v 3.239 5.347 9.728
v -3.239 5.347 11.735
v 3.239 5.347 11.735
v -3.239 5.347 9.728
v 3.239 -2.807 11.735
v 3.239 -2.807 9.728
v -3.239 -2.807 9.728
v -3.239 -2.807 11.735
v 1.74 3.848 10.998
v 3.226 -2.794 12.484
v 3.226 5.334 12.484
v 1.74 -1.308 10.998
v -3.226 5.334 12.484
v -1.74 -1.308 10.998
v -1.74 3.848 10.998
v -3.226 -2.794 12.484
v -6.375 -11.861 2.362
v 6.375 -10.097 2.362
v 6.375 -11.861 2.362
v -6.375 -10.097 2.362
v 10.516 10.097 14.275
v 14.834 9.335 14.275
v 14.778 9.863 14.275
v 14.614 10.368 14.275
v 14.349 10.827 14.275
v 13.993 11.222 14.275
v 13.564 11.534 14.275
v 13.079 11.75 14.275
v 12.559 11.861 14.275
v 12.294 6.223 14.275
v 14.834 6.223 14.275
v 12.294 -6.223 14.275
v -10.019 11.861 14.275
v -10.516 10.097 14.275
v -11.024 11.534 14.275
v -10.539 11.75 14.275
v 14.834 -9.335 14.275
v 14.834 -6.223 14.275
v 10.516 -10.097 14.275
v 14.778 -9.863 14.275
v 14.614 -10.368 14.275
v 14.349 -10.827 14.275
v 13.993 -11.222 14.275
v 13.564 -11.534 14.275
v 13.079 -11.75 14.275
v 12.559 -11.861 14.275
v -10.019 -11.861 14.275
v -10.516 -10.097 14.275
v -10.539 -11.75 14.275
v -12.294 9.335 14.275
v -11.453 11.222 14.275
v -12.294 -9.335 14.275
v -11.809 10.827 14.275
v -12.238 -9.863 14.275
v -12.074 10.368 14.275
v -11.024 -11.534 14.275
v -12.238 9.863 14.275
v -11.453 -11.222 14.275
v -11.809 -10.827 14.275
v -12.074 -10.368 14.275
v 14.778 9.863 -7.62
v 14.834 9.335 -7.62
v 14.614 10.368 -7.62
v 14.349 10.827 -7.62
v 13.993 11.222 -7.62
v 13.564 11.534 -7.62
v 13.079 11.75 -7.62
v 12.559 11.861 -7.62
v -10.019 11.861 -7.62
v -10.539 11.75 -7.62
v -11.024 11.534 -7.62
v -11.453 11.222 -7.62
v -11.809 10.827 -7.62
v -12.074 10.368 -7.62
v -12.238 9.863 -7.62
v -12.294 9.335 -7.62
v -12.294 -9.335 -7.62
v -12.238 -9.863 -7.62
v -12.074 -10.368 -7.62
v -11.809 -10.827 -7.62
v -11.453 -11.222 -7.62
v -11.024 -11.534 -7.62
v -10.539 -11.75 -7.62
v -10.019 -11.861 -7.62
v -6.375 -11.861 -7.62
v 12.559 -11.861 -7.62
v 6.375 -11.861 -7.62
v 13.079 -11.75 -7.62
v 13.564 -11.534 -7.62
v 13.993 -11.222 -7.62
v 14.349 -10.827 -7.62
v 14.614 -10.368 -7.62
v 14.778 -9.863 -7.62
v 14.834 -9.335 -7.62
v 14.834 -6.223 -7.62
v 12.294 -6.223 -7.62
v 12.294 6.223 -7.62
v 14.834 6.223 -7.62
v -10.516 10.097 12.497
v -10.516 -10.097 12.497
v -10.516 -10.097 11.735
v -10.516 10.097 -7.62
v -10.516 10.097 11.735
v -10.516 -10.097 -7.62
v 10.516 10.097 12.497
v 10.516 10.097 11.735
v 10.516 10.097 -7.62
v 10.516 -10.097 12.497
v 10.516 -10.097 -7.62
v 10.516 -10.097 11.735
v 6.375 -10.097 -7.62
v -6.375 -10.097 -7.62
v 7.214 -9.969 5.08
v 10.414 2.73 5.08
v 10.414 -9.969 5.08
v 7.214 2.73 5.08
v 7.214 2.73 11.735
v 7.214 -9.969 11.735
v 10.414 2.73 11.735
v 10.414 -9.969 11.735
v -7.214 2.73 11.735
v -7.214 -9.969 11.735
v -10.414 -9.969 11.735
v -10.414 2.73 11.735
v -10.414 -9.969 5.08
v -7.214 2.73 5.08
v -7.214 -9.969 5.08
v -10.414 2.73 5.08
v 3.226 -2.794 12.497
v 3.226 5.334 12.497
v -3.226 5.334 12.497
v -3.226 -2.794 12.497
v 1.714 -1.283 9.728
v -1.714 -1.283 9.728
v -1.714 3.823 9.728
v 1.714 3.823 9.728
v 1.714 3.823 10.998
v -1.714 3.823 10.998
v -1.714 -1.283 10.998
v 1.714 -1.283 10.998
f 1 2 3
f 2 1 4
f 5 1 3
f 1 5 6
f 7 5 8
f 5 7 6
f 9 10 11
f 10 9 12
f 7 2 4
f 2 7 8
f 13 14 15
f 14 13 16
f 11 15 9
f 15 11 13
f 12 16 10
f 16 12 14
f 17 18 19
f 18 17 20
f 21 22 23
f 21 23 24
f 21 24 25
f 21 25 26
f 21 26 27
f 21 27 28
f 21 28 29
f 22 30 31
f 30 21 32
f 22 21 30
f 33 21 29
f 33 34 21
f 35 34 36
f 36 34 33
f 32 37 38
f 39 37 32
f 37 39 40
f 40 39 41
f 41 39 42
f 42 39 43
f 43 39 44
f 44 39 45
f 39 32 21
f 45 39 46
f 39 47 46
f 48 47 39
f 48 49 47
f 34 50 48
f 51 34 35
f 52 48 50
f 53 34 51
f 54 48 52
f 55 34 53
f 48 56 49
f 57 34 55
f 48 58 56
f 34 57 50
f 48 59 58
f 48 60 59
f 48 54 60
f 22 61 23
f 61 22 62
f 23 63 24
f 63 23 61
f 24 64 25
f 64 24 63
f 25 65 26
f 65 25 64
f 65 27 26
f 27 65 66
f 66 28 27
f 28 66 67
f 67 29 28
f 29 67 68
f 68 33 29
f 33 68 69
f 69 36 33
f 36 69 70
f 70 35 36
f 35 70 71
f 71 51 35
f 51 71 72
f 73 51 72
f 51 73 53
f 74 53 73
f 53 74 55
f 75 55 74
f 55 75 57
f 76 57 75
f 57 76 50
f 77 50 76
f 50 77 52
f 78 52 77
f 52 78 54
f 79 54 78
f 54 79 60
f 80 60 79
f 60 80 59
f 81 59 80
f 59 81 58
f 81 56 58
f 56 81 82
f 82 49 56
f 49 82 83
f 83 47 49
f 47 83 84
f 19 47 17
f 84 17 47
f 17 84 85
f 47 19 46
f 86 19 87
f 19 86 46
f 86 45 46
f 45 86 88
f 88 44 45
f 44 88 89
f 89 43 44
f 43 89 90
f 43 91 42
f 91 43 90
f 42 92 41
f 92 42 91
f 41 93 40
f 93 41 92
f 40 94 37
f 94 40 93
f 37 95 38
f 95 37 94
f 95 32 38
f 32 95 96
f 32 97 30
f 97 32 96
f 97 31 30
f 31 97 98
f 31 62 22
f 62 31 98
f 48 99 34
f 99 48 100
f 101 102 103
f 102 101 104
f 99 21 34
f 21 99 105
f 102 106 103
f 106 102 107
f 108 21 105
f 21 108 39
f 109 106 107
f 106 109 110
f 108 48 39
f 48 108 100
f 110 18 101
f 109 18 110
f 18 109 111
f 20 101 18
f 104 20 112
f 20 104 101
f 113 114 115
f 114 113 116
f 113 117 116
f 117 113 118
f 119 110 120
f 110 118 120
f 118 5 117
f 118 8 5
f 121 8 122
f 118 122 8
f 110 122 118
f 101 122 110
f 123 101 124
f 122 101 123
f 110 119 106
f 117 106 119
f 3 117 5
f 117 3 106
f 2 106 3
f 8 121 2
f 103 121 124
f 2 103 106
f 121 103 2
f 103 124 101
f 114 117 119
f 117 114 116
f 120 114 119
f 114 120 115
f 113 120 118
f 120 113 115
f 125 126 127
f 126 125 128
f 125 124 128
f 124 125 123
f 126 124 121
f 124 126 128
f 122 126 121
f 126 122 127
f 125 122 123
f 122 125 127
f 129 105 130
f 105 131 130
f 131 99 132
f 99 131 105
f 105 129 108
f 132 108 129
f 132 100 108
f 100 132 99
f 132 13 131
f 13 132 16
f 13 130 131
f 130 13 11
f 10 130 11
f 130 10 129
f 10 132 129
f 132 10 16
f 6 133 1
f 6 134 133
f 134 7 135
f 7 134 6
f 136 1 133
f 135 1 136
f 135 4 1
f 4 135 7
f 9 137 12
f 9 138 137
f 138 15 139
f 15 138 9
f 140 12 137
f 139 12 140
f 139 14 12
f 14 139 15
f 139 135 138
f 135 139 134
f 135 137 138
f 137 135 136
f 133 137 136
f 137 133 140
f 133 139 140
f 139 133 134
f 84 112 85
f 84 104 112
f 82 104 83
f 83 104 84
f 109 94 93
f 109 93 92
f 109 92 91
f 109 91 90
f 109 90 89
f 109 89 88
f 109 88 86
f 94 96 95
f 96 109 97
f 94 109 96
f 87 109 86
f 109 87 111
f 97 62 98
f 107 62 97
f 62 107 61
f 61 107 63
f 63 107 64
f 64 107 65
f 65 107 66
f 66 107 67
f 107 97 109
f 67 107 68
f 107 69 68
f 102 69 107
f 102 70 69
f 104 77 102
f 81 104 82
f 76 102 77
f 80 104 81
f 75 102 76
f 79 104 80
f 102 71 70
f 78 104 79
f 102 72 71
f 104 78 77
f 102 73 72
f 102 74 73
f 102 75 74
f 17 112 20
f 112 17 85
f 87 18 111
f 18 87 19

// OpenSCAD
// file: apds9660Surround.scad
module side(l,d)
{
    rotate([90, 0, 0])
    translate([-d, 0, -l/2])
    linear_extrude(l)
    polygon(points=[[0, 0], [d, 0],[d, d]]);
}

module sides(w, h, d)
{
    union() {
   translate([h/2, 0, 0])  rotate([0, 0, 0]) side(w,d);
   translate([-h/2, 0, 0])  rotate([0, 0, 180]) side(w,d);

   translate([0, w/2, 0])  rotate([0, 0, 90]) side(h,d);
   translate([0, -w/2, 0])  rotate([0, 0, -90]) side(h,d);
    }
}

//// w,h,d 
//sides(500, 600, 100);
//
//linear_extrude(100)
//difference(){
//    square([800, 700], center=true);
//    square([600, 500], center=true);
//}
// file: model_adps9660.scad
module ADPS9660Carrier()
{
    color("CornflowerBlue")
    {
    // pcb + midboard
    linear_extrude(200)
    square([788, 755], center=true);

    // usb 
    translate([0, -755/2-422/2, 0])
    linear_extrude(83)
    square([482, 422], center=true);

    // solder joints on to of midboard
    translate([0, 422-120, 200])
    linear_extrude(75)
    square([606, 120], center=true);

    // solder joints under midboard
    translate([0, 422-120, -75])
    linear_extrude(75)
    square([606, 120], center=true);

    // APDS9660 carrier
    translate([0, -(755-521)/2+35, 200])
    linear_extrude(177)
    square([532, 521], center=true);

    // solder joints on carrier 
    translate([0, -(755-120)/2+35, 377])
    linear_extrude(75)
    square([532, 120], center=true);

    // left lower header base
    translate([-(568+100)/2, -(600-422)/2+20, -100])
    linear_extrude(100)
    square([100, 600], center=true);

    // right lower header base
    translate([(568+100)/2, -(600-422)/2+20, -100])
    linear_extrude(100)
    square([100, 600], center=true);

    // left lower headers
    translate([-(568+100)/2, -(600-422)/2+20, -320])
    linear_extrude(220)
    square([28, 524], center=true);

    // right lower header base
    translate([(568+100)/2, -(600-422)/2+20, -320])
    linear_extrude(220)
    square([28, 524], center=true);
    }

    color("OrangeRed")
    {
    // APDS9660 sensor
    translate([0, 521/2-161, 377])
    linear_extrude(56)
    square([95, 161], center=true);
    }
}
// main file
use <model_adps9660.scad>
use <apds9660Surround.scad>

ViewScale = [0.0254, 0.0254, 0.0254];

module rectHull(r, x, y)
{
    hull()
    {
        // place 4 circles in the corners, with the given r
        //translate([(-x/2)+(r/2), (-y/2)+(r/2), 0])
        translate([(-x/2)+r, (-y/2)+r, 0])
            circle(r=r);

        //translate([(x/2)-(r/2), (-y/2)+(r/2), 0])
        translate([(x/2)-r, (-y/2)+r, 0])
            circle(r=r);

        //translate([(-x/2)+(r/2), (y/2)-(r/2), 0])
        translate([(-x/2)+r, (y/2)-r, 0])
            circle(r=r);

        //translate([(x/2)-(r/2), (y/2)-(r/2), 0])
        translate([(x/2)-r, (y/2)-r, 0])
            circle(r=r);
    }
}

module box()
{
    //ADPS9660Carrier();

    // main pcb surround
    translate([0, 0, 93])
    linear_extrude(469)
    {
    difference() {
    translate([50, 0, 0])
    rectHull(100, 1068, 935);
    square([828, 795], center=true);
    translate([(968+100)/2, 0, 0])
    square([100, 490], center=true);
    }
    // clip rails
    translate([795/2+175-50, 295]) square([100, 100], center=true);
    translate([795/2+175-50, -295]) square([100, 100], center=true);
    }

    // right support
    translate([(788-100)/2+3, -(755-500)/2-15, 200])
    linear_extrude(262)
    square([126, 500], center=true);

    // left support
    translate([-(788-100)/2-3, -(755-500)/2-15, 200])
    linear_extrude(262)
    square([126, 500], center=true);

    // cover
    translate([0, 0, 462])
    linear_extrude(30)
    difference() {
    rectHull(100, 968, 935);
    translate([0, 50, 0])
    square([254, 320], center=true);
    }

    // mounting around sensor
    // w,h,d 
    //translate([0, 50, 392])
    translate([0, 50, 432])
    {
        //sides(381, 315, 100);
        sides(321, 255, 60);
    }

    // mounting support
    translate([0, 50, 383])
    linear_extrude(50)
    difference() {
        square([255, 321], center=true);
        square([135, 201], center=true);
    }

    // surround with cutout for usb
    translate([0, 0, -300])
    linear_extrude(403) {
    difference() {
    translate([50, 0, 0])
    rectHull(100, 1068, 935);
    square([828, 795], center=true);
    translate([0, -(755)/2, 0])
    square([502, 200], center=true);
    translate([(968+100)/2, 0, 0])
    square([100, 490], center=true);
    }
    // clip rails
    translate([795/2+175-50, 295]) square([100, 100], center=true);
    translate([795/2+175-50, -295]) square([100, 100], center=true);
    }

//    // clip base
//    #translate([(935-75+240)/2+20, 0, -714])
//    linear_extrude(100)
//    square([75+240, 502], center=true);
//
//    // clip tongue
//    #translate([(935+240-50+210)/2, 0, -614])
//    linear_extrude(900)
//    square([100, 480], center=true);
//
//    // clip base old
//    *translate([0, -(818-75+230)/2-68, 93])
//    linear_extrude(100)
//    square([502, 75+240], center=true);
//
//    // clip tongue old
//    *#translate([0, -(818-75+210+190)/2-82, 193])
//    linear_extrude(500)
//    square([480, 100], center=true);
}

module clip()
{
    linear_extrude(480)
    {
    // tongue
    square([900, 100], center=true);
    // spine
    translate([-370/2, -230])
    square([1270, 100], center=true);
    //base
    translate([(900-100)/2, -150+50-15])
    square([100, 330], center=true);
    }
}

scale(ViewScale)
{
//    translate([760, 240, -260])
//    rotate([90, 90, 0])
//    color("CornflowerBlue")
//    clip();
    box();
}
